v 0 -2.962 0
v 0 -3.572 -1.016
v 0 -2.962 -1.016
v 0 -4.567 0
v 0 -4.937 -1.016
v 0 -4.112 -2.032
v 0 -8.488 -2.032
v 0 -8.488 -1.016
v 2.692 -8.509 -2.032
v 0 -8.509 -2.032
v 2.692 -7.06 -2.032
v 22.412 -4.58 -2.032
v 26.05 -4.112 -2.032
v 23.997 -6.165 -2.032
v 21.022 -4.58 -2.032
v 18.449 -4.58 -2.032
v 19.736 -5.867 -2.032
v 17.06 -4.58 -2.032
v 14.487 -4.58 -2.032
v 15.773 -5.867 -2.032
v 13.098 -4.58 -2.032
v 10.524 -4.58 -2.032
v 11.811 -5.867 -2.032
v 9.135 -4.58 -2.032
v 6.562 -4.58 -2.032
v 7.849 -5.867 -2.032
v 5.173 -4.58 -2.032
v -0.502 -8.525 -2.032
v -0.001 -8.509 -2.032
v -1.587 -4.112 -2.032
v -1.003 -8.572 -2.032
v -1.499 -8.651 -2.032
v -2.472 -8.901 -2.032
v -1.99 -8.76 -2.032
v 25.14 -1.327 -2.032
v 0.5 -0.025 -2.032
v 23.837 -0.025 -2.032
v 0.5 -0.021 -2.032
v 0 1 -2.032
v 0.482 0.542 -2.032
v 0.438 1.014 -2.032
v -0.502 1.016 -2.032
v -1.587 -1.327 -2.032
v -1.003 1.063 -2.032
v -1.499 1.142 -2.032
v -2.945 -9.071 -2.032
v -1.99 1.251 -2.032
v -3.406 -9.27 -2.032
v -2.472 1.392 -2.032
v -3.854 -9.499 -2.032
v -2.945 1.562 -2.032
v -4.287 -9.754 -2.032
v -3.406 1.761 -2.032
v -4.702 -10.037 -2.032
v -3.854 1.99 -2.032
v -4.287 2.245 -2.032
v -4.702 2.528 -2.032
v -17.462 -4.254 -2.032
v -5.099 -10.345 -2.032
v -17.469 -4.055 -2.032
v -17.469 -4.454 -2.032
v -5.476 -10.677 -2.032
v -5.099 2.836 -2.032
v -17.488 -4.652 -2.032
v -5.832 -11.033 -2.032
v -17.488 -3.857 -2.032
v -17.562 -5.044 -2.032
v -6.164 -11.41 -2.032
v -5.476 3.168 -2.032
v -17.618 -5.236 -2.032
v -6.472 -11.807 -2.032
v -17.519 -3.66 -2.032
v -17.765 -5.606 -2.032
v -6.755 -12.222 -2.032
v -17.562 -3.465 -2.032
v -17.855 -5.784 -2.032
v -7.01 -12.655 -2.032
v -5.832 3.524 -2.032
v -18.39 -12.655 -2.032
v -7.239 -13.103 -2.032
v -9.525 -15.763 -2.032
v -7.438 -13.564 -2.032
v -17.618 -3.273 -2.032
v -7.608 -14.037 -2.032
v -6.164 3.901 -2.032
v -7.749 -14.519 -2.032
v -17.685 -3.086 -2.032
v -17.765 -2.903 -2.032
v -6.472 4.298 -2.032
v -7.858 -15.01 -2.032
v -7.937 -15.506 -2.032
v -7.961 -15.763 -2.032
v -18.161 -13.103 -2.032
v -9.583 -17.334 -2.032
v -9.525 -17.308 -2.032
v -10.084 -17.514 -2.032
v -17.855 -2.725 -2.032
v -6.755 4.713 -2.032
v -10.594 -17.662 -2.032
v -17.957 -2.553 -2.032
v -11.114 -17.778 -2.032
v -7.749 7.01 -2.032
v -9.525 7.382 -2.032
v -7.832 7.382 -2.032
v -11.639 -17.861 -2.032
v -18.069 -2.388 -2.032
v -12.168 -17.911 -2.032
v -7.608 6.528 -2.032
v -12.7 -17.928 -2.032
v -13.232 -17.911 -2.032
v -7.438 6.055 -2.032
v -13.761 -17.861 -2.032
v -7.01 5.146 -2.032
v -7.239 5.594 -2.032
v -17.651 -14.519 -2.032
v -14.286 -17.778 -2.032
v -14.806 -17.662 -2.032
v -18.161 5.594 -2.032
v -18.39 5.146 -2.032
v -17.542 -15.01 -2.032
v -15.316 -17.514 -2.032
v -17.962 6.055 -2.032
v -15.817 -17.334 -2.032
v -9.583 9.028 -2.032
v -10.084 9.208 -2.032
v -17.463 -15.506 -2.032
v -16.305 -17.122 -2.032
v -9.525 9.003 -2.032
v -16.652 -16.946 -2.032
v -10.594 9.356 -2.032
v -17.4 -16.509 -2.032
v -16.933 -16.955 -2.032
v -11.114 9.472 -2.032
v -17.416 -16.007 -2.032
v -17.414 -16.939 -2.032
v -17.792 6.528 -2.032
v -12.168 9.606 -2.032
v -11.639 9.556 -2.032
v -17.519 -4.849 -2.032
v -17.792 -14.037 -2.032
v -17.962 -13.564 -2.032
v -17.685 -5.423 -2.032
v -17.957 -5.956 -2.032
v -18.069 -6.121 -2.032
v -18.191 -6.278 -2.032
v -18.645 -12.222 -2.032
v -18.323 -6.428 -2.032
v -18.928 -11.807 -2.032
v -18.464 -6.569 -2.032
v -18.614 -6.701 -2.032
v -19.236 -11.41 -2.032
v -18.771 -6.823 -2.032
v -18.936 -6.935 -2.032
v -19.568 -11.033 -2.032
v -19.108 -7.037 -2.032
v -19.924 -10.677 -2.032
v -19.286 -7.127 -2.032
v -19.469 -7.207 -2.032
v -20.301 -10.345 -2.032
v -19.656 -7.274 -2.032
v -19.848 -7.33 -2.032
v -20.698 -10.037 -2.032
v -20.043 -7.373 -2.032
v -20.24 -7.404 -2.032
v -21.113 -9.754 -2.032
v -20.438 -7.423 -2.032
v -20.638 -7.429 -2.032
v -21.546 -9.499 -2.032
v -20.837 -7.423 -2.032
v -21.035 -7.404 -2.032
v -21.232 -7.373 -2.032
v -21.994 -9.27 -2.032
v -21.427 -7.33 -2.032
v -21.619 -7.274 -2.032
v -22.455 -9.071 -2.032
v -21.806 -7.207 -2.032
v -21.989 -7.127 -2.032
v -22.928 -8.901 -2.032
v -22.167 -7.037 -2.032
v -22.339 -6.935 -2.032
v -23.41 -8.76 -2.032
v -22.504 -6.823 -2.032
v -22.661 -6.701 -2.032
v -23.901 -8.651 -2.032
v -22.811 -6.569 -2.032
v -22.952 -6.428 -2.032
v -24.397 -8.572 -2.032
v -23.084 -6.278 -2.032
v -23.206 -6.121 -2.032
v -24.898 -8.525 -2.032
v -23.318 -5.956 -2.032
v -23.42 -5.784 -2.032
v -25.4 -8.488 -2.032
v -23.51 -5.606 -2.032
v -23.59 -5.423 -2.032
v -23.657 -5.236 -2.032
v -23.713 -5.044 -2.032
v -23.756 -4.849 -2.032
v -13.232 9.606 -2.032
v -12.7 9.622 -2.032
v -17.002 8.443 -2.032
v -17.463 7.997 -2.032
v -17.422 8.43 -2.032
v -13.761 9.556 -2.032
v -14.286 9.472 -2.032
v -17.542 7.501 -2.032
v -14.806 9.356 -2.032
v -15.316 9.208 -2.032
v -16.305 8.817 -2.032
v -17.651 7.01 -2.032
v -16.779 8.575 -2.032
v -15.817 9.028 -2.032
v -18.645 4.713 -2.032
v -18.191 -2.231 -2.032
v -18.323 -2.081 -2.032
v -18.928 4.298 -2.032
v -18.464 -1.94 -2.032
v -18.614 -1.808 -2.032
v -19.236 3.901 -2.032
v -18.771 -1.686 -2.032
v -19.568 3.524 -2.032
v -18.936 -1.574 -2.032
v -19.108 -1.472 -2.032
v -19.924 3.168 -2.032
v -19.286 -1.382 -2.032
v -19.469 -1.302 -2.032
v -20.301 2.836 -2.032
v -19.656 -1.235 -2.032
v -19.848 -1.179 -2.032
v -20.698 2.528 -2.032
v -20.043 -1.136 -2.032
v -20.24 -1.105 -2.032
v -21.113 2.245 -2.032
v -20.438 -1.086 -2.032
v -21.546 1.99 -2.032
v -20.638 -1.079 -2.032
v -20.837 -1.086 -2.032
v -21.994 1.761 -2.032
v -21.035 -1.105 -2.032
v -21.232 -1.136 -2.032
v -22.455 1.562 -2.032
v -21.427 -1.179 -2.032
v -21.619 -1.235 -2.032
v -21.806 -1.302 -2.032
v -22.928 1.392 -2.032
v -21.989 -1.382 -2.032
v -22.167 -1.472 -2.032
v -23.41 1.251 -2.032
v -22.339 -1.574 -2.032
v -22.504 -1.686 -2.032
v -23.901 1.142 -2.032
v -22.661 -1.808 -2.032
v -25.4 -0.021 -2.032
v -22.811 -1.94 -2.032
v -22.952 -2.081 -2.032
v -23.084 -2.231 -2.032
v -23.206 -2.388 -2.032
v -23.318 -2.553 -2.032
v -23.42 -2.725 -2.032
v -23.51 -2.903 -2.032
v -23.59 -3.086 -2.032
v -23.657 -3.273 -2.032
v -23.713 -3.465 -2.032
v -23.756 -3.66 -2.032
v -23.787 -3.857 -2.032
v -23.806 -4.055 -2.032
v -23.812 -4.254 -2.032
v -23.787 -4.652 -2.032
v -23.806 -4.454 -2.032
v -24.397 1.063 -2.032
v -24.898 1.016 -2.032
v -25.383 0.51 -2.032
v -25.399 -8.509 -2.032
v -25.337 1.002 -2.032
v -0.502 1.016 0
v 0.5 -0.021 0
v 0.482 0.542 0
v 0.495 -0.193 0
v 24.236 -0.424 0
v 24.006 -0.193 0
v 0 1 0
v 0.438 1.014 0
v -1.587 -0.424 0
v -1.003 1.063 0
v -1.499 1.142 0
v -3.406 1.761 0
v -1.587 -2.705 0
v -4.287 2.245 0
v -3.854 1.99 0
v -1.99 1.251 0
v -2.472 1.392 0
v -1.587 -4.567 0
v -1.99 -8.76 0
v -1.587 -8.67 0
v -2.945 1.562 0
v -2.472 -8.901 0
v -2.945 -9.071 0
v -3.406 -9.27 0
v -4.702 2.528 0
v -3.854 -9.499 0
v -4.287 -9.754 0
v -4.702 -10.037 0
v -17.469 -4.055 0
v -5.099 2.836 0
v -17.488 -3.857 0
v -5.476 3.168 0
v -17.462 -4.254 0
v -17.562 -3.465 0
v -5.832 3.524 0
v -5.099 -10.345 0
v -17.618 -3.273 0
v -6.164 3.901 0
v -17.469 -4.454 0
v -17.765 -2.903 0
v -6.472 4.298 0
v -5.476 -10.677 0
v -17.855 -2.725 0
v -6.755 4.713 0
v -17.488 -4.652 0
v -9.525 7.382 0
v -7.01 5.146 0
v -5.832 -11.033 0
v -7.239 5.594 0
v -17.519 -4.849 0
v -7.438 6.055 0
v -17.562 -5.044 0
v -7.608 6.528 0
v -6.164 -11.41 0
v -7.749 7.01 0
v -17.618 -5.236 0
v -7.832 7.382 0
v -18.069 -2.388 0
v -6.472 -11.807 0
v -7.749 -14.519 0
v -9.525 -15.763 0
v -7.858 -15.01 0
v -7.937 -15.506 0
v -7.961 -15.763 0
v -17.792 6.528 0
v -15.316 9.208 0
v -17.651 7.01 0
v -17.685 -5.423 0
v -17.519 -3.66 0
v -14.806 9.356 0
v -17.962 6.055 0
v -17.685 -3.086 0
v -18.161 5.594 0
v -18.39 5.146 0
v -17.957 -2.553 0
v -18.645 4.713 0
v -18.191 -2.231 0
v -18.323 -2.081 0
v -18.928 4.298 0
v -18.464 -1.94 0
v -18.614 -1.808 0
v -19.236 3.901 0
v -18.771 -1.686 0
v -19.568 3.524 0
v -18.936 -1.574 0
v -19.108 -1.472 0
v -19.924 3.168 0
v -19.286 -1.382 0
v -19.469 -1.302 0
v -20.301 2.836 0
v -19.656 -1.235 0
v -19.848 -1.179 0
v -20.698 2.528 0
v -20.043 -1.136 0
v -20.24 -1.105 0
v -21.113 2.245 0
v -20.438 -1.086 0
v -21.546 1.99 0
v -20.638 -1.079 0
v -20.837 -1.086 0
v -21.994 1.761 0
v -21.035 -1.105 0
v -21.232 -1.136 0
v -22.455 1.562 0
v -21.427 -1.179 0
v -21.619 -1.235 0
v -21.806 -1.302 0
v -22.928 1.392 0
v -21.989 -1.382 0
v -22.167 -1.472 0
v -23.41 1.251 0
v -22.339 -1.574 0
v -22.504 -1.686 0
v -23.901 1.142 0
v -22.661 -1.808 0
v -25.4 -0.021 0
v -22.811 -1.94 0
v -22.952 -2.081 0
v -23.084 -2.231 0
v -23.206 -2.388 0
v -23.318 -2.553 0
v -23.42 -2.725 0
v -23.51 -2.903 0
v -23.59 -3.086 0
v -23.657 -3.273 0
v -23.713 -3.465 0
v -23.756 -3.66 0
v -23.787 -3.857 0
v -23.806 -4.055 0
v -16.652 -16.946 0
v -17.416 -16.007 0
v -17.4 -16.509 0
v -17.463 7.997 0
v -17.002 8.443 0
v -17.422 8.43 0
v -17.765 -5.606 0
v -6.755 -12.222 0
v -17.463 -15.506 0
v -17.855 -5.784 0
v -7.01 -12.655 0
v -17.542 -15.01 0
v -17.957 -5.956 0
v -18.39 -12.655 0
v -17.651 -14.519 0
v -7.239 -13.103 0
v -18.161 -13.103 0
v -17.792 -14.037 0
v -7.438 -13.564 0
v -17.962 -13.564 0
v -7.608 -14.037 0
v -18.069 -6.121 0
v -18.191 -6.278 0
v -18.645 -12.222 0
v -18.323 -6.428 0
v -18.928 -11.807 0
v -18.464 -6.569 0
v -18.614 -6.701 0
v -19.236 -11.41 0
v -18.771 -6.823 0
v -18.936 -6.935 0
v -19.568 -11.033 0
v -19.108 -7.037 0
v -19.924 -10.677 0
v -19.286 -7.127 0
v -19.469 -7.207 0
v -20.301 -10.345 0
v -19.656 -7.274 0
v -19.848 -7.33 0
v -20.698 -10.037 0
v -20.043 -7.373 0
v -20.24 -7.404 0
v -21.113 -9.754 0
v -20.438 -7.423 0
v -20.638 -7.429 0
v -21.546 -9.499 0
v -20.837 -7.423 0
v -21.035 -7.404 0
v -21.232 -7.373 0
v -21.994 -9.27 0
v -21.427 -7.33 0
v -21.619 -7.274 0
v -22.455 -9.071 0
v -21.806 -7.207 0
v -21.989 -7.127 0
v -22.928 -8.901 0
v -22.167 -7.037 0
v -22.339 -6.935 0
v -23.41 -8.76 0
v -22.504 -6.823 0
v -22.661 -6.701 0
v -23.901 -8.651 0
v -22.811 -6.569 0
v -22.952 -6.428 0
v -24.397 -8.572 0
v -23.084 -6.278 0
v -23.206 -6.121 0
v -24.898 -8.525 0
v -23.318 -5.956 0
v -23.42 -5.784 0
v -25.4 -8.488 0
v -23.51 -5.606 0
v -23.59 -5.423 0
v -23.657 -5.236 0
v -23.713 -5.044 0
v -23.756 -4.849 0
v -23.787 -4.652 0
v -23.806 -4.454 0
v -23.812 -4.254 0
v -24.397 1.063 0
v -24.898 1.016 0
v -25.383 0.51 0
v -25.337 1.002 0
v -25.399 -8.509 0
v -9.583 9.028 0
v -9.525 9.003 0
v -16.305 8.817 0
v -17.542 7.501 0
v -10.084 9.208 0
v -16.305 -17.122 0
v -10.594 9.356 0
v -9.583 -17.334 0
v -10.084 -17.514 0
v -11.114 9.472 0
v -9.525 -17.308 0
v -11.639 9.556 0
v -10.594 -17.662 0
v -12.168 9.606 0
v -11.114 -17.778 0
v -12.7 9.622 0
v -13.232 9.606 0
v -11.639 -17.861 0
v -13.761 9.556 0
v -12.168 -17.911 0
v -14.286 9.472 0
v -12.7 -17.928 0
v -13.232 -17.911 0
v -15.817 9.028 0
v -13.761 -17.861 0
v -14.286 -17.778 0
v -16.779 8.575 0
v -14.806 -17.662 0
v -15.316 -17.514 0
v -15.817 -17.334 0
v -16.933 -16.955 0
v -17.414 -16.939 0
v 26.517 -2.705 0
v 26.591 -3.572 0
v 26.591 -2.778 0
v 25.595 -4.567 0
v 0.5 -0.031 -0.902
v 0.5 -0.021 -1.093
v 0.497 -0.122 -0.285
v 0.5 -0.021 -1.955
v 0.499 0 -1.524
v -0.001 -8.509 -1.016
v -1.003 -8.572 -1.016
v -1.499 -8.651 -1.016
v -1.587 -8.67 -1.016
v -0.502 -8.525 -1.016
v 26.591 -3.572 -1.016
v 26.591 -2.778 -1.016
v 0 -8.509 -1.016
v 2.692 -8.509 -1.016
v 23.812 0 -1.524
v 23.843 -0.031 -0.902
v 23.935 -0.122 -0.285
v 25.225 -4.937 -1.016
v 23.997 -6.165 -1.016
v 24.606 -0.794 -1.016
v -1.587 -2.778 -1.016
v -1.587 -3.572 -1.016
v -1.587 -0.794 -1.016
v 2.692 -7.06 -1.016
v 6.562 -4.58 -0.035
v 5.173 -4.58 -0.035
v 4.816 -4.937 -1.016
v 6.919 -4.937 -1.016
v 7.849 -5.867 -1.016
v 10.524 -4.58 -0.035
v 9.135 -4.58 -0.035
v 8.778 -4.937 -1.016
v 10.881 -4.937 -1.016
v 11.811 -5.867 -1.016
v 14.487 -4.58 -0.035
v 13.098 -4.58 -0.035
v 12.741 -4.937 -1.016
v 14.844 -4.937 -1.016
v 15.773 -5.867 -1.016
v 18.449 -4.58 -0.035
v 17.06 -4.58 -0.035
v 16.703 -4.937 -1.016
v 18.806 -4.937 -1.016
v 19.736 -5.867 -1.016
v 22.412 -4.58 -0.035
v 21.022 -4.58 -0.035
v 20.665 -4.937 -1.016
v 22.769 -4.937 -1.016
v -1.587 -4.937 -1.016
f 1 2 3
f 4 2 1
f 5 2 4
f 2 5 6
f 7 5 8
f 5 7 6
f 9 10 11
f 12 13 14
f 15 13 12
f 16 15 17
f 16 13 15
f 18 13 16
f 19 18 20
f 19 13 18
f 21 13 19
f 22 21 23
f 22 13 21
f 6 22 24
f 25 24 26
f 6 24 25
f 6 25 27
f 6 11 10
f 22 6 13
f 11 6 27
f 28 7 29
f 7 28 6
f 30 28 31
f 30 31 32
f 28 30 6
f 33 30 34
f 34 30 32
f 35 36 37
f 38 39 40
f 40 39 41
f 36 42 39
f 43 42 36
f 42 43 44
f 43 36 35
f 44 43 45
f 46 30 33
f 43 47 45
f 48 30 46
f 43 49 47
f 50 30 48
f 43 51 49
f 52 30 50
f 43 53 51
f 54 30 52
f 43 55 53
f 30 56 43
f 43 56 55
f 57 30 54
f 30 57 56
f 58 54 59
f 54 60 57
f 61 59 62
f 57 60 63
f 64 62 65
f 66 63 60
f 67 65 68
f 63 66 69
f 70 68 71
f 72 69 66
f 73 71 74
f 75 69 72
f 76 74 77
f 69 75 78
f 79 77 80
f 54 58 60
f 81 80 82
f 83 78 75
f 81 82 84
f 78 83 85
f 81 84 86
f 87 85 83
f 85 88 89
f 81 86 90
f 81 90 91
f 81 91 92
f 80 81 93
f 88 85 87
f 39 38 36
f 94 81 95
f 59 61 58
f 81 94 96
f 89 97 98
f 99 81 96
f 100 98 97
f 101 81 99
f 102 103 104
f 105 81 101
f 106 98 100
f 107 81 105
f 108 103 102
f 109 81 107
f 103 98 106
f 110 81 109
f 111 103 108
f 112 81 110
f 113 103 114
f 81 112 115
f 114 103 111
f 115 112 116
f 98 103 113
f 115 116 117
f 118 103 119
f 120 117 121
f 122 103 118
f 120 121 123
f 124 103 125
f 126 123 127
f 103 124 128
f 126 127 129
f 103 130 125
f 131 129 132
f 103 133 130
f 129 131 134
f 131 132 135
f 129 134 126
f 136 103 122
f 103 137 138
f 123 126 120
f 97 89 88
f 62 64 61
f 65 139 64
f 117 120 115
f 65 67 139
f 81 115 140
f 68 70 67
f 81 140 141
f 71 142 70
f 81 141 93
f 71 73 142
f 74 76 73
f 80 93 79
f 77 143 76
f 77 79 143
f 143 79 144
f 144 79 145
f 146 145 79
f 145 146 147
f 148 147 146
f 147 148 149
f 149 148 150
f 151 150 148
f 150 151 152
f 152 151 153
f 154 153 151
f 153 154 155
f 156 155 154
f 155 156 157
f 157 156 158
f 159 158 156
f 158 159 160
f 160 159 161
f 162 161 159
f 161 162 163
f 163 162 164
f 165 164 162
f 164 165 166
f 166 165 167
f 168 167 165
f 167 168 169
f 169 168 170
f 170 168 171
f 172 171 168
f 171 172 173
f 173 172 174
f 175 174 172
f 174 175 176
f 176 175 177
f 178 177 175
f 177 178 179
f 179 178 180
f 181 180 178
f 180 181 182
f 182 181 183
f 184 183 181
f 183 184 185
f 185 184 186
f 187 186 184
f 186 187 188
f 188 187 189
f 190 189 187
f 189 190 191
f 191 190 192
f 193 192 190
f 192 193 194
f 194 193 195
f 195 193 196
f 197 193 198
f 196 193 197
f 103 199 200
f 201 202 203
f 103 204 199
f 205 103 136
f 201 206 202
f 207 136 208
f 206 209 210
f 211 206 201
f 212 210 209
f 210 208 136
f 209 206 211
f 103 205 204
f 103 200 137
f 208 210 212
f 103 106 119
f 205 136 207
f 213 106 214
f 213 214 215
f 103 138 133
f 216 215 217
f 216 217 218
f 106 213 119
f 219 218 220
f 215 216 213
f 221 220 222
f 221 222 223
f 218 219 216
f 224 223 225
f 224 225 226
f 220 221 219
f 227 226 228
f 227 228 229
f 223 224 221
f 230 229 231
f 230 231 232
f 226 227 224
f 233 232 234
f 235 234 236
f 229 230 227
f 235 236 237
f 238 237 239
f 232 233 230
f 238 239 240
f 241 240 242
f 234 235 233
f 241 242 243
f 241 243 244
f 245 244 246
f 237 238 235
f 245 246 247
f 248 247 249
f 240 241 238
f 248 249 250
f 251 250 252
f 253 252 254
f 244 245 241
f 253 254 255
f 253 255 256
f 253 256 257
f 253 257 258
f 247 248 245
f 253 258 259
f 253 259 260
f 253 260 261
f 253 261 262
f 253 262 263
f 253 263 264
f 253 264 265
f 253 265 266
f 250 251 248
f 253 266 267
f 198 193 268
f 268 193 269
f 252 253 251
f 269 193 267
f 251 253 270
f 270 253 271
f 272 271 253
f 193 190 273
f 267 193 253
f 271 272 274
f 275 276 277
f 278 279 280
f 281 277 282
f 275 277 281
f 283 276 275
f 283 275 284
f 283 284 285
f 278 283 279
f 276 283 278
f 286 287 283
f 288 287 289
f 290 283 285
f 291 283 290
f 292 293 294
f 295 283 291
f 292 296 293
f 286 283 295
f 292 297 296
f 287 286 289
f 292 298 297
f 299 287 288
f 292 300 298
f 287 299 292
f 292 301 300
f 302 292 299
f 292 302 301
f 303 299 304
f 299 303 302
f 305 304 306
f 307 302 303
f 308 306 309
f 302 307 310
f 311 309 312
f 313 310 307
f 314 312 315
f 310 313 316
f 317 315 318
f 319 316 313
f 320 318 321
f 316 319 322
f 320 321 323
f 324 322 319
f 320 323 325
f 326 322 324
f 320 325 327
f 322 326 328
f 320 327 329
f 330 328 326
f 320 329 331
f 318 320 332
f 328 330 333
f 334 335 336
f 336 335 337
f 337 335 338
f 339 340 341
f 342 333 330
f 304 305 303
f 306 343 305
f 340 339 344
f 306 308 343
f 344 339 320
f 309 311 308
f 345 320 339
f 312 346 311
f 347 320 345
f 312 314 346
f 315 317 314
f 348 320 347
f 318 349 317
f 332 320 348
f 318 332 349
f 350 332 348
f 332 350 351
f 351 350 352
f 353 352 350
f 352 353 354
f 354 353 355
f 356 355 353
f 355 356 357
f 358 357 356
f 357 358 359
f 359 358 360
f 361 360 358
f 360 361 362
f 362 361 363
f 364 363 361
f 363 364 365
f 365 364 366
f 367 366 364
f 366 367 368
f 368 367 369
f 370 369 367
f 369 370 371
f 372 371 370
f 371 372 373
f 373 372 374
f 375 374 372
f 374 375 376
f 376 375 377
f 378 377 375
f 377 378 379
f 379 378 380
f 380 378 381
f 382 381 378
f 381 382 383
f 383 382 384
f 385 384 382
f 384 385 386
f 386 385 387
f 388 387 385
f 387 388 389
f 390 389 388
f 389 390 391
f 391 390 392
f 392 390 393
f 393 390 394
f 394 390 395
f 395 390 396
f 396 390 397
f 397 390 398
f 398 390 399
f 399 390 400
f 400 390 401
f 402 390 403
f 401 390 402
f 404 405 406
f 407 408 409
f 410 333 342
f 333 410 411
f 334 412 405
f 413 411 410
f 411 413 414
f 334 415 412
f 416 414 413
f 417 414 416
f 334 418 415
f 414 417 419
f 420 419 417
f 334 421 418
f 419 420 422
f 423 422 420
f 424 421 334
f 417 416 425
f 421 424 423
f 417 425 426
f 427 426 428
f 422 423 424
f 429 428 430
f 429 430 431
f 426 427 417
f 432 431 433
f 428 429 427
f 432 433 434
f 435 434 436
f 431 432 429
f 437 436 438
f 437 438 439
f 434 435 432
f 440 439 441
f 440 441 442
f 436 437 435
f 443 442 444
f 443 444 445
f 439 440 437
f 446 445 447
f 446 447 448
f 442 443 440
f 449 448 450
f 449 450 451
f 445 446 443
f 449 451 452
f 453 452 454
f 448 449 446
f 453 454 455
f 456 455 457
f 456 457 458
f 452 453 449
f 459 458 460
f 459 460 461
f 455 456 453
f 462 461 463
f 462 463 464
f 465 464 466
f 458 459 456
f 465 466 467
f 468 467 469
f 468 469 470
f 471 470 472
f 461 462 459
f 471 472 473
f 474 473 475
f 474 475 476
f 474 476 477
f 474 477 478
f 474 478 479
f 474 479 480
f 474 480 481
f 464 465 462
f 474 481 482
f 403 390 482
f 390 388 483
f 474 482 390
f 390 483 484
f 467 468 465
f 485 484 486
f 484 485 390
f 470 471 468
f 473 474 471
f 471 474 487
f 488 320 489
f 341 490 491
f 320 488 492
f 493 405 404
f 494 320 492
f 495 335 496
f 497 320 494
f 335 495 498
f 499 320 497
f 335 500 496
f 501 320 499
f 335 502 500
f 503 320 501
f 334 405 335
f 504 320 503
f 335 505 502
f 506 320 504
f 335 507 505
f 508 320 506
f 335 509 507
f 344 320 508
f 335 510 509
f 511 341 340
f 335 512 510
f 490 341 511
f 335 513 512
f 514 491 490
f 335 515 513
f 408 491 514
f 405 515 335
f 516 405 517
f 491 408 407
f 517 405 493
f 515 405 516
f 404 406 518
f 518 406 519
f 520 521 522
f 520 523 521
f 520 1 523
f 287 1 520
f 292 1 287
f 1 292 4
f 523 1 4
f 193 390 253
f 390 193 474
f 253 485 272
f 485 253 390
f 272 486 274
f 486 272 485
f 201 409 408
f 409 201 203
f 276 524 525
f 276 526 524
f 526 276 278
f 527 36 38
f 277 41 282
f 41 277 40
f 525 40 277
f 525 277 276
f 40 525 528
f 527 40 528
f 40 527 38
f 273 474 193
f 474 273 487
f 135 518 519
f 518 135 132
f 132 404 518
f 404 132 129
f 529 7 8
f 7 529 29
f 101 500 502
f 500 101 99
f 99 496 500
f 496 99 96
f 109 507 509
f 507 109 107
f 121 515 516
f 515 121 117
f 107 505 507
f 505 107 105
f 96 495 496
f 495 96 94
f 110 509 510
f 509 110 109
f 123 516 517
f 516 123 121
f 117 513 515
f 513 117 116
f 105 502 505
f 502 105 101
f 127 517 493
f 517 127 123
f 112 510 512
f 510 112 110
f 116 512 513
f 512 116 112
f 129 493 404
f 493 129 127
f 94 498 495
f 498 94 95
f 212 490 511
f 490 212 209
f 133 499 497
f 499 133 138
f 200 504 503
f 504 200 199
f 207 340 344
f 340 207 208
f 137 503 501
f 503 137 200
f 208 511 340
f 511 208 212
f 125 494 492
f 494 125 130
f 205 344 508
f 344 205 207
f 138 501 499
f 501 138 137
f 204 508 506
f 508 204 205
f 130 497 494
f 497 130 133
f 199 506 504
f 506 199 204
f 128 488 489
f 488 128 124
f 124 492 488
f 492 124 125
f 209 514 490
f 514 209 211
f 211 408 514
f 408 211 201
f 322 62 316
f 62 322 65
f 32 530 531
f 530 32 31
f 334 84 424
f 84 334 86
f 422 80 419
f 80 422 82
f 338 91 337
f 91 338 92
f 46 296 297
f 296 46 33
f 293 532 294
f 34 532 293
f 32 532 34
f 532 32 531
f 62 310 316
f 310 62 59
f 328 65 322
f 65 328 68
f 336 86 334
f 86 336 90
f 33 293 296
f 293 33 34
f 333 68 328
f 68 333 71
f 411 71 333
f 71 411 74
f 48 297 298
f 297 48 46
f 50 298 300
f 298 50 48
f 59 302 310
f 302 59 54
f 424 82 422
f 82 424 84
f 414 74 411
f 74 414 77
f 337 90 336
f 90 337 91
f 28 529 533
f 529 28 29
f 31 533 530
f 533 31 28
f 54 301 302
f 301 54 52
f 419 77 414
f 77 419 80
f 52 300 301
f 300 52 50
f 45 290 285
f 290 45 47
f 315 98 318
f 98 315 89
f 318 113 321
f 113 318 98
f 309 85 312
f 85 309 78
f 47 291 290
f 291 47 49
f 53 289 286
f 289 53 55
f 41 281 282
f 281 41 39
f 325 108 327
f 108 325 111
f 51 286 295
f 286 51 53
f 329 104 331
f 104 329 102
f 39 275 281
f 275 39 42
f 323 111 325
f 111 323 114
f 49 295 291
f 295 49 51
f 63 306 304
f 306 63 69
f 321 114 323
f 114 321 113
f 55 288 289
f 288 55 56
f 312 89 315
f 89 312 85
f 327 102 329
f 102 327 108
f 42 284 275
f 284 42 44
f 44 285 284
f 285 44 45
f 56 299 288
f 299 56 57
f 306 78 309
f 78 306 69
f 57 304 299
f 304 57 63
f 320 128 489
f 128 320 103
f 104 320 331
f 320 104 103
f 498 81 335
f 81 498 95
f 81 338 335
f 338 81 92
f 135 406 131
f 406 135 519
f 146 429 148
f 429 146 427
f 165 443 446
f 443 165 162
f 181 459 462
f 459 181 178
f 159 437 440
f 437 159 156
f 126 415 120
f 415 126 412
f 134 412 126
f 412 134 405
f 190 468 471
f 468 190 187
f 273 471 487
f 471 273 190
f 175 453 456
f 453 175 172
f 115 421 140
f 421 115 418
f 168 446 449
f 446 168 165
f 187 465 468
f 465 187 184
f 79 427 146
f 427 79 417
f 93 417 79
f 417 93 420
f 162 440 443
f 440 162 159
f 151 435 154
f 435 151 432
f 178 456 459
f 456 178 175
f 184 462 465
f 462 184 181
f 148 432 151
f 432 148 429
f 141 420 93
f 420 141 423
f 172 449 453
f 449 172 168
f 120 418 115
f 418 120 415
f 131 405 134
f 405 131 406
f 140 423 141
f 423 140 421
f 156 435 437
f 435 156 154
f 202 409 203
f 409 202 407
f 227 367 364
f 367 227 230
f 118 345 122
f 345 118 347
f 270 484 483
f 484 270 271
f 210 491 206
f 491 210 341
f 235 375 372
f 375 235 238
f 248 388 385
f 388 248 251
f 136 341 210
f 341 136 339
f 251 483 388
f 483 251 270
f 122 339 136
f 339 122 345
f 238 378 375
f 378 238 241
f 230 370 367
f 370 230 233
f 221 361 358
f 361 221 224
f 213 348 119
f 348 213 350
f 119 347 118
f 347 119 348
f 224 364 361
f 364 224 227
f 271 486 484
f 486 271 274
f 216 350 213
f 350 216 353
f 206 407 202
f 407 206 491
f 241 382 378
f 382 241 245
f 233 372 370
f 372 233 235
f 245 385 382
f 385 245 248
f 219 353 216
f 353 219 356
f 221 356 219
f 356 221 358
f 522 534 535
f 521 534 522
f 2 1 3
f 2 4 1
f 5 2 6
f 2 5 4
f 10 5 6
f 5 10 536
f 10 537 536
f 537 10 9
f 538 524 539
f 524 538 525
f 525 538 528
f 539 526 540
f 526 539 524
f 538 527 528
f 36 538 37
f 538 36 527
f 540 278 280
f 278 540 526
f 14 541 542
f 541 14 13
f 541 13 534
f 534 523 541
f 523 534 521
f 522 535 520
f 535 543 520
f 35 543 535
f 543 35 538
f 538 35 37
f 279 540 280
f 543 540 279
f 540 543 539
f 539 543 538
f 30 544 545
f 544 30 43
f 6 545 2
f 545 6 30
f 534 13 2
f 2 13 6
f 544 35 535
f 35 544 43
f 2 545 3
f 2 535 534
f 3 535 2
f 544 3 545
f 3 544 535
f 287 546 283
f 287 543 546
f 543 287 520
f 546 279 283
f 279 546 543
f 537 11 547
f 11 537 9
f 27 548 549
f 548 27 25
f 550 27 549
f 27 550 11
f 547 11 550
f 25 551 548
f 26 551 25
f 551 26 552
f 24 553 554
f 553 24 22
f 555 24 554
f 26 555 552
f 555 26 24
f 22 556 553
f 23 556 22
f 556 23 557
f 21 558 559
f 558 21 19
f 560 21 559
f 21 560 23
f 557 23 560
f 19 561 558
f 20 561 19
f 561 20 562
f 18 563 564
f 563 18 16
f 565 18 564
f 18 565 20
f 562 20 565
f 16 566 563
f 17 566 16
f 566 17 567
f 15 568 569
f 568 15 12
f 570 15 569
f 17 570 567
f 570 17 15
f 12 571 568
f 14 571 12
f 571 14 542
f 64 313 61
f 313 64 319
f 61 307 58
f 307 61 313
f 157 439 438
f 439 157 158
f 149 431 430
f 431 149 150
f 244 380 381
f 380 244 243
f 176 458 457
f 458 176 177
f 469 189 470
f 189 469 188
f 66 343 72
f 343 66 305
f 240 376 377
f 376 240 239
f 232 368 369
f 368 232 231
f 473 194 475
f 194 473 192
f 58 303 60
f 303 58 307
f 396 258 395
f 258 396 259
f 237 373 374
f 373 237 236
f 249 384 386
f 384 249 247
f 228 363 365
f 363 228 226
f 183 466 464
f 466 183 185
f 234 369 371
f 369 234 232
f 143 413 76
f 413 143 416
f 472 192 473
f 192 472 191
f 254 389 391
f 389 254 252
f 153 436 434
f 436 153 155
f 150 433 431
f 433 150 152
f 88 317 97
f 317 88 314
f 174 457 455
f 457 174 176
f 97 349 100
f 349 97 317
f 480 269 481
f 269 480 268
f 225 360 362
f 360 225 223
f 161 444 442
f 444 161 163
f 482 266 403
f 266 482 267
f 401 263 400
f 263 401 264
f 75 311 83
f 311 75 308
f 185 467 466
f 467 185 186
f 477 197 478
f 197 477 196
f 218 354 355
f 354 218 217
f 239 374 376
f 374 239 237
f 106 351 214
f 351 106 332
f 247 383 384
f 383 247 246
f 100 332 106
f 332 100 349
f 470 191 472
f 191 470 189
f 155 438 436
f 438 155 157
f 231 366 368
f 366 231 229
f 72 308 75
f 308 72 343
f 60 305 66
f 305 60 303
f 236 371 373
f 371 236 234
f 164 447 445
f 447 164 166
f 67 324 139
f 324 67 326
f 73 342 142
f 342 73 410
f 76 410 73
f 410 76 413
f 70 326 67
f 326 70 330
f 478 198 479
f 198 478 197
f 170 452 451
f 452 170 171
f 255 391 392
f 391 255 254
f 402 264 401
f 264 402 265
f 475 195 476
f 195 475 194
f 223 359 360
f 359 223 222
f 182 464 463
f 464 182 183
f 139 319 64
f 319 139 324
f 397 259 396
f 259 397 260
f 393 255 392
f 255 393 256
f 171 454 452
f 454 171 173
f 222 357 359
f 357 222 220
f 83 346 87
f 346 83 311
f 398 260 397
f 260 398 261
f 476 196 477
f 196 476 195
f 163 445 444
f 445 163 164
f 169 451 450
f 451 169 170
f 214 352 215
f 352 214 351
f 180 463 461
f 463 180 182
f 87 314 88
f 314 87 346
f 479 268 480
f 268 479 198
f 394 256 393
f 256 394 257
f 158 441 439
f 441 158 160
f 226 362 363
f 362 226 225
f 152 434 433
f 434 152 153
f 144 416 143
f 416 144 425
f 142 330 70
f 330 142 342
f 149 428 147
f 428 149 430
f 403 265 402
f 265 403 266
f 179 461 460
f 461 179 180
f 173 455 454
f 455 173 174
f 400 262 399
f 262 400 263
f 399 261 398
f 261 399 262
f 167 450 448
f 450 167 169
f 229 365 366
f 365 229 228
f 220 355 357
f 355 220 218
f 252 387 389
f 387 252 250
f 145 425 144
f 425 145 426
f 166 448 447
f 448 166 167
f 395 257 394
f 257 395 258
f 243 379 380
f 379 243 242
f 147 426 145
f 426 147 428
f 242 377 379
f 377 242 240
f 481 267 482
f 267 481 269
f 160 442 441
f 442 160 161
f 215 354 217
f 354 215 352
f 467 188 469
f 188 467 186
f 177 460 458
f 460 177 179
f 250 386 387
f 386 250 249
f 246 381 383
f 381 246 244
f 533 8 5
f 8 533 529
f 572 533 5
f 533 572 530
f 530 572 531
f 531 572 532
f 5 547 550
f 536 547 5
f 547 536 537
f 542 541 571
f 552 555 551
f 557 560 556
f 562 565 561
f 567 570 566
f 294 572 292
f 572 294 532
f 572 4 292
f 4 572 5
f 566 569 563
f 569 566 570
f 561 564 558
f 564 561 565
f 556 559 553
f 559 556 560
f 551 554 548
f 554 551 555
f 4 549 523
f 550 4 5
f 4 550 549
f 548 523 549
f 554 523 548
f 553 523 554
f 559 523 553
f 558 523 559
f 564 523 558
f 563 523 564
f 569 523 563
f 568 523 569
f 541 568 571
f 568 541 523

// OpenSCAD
// Physical Keygen - by Nirav Patel <http://eclecti.cc>
//
// Generate a duplicate of a Schlage SC1 key by editing the last line of the file
// and entering in the key code of the lock.  If you don't know the key code,
// you can measure the key and compare the numbers at:
// http://web.archive.org/web/20050217020917fw_/http://dlaco.com/spacing/tips.htm
//
// This work is licensed under a Creative Commons Attribution 3.0 Unported License.

// Since the keys and locks I have were all designed in imperial units, the
// constants in this file will be defined in inches.  The mm function
// allows us to retain the proper size for exporting a metric STL.
function mm(i) = i*25.4;
$fn = 100;
module rounded(size, r) {
	 
    union() {
	
     *   translate([r, 0, 0]) cube([size[0]-2*r, size[1], size[2]]);
       translate([0, r, 0]) cube([size[0], size[1]-2*r, size[2]]);
        translate([r, r, 0]) cylinder(h=size[2], r=r);
        translate([size[0]-r, r, 0]) cylinder(h=size[2], r=(r+.5));
        translate([r, size[1]-r, 0]) cylinder(h=size[2], r=(r));
        translate([size[0]-r, size[1]-r, 0]) cylinder(h=size[2], r=r);
	    translate([(mm(1))/2, mm(.205) + ((mm(1))/2), 0]) cylinder(h= size[2], r=r);
	    translate([(mm(1))/2, mm(.287), 0]) cylinder(h= size[2], r=r);
	  }
}

module bit() {
    w = mm(1/4);
    difference() {
        translate([-w/2, 0, 0]) cube([w, mm(1), w]);
        translate([-mm(7/256), 0, 0]) rotate([0, 0, 135]) cube([w, w, w]);
         translate([mm(7/256), 0, 0]) rotate([0, 0, -45]) cube([w, w, w]);
    }
}

// Schlage SC1 5 pin key.  The measurements are mostly guesses based on reverse
// engineering some keys I have and some publicly available information. 
module sc1(bits) {
    // You may need to adjust these to fit your specific printer settings
    thickness = mm(0.080);
    length = mm(17/16);
    width = mm(.335);
    
    shoulder = mm(.231);
    pin_spacing = mm(.156);
    depth_inc = mm(.015);
    
    // A fudge factor.  Printing with your average RepRap, the bottom layer is
    // going to be squeezed larger than you want. You can make the pins
    // go slighly deeper by a fudge amount to make up for it if you aren't
    // adjusting for it elsewhere like Skeinforge or in your firmware.
    // 0.5mm works well for me.
    fudge = 0.5;
    
    // Handle size
    h_l = mm(1);
    h_w = mm(1);
    h_d = mm(1/16);
    difference() {
        // blade and key handle
        union() {
                translate([-h_l, -h_w/2 + width/2, 0])  difference() {
                rounded([h_l, h_w, thickness], mm(1/3));
                // Round out edge of bow to blade            
                translate([h_l, h_w/2 + width/2 + 8, 0]) cylinder(h=thickness, r=8);
                translate([h_l, h_w/2 - width/2 - 9 , 0]) cylinder(h=thickness, r=8);
			   translate([(5*h_l)/8, -3, 0])  cube([2*thickness, 2*thickness, thickness]);
			   translate([(5*h_l)/8, 3 + width + ( h_l/2), 0])  cube([2*thickness, 2*thickness, thickness]);
			     *  translate([(9*h_l)/30, 3 + width + ( h_l/2), 0])  cube([(2*thickness)/3, 2*thickness, thickness]);
                translate([0 , h_w/2 + width/2 + 8, 0]) cylinder(h=thickness, r=8);
                translate([0, h_w/2 - width/2 - 9 , 0]) cylinder(h=thickness, r=8);
		       }
            intersection() {
                // cut a little off the tip to avoid going too long
                cube([length - mm(1/64), width, thickness]);
                translate([0, mm(1/4), thickness*3/4]) rotate([0, 90, 0]) cylinder(h=length, r=mm(1/4), $fn=64);
            }
        }
        
        // chamfer the tip
        translate([length, mm(1/8), 0]) {
            rotate([0, 0, 45]) cube([10, 10, thickness]);
            rotate([0, 0, 225]) cube([10, 10, thickness]);
        }
        
        // put in a hole for keychain use
        translate([-h_l + mm(3/16), width/2, 0]) cylinder(h=thickness, r=mm(1/8));
        
        // cut the channels in the key.  designed more for printability than accuracy
        union() {
            translate([-h_d, mm(9/64), thickness/2]) rotate([62, 0, 0]) cube([length + h_d, width, width]);
            translate([-h_d, mm(7/64), thickness/2]) rotate([55, 0, 0]) cube([length + h_d, width, width]);
            translate([-h_d, mm(7/64), thickness/2]) cube([length + h_d, mm(1/32), width]);
        }
        
        translate([-h_d, width - mm(9/64), 0]) cube([length + h_d, width - (width - mm(10/64)), thickness/2]);
        translate([-h_d, width - mm(9/64), thickness/2]) rotate([-110, 0, 0]) cube([length + h_d, width, thickness/2]);
        
        intersection() {
            translate([-h_d, mm(1/32), thickness/2]) rotate([-118, 0, 0]) cube([length + h_d, width, width]);
            translate([-h_d, mm(1/32), thickness/2]) rotate([-110, 0, 0]) cube([length + h_d, width, width]);
        }
        
        // Do the actual bitting
        for (b = [0:4]) {
            translate([shoulder + b*pin_spacing, width - bits[b]*depth_inc - fudge, 0]) bit();
        }
    }
}

// This sample key goes to a lock that is sitting disassembled on my desk
// Flip the key over for easy printing
rotate([180, 0, 0]) sc1([9,9,9,9,9]);
